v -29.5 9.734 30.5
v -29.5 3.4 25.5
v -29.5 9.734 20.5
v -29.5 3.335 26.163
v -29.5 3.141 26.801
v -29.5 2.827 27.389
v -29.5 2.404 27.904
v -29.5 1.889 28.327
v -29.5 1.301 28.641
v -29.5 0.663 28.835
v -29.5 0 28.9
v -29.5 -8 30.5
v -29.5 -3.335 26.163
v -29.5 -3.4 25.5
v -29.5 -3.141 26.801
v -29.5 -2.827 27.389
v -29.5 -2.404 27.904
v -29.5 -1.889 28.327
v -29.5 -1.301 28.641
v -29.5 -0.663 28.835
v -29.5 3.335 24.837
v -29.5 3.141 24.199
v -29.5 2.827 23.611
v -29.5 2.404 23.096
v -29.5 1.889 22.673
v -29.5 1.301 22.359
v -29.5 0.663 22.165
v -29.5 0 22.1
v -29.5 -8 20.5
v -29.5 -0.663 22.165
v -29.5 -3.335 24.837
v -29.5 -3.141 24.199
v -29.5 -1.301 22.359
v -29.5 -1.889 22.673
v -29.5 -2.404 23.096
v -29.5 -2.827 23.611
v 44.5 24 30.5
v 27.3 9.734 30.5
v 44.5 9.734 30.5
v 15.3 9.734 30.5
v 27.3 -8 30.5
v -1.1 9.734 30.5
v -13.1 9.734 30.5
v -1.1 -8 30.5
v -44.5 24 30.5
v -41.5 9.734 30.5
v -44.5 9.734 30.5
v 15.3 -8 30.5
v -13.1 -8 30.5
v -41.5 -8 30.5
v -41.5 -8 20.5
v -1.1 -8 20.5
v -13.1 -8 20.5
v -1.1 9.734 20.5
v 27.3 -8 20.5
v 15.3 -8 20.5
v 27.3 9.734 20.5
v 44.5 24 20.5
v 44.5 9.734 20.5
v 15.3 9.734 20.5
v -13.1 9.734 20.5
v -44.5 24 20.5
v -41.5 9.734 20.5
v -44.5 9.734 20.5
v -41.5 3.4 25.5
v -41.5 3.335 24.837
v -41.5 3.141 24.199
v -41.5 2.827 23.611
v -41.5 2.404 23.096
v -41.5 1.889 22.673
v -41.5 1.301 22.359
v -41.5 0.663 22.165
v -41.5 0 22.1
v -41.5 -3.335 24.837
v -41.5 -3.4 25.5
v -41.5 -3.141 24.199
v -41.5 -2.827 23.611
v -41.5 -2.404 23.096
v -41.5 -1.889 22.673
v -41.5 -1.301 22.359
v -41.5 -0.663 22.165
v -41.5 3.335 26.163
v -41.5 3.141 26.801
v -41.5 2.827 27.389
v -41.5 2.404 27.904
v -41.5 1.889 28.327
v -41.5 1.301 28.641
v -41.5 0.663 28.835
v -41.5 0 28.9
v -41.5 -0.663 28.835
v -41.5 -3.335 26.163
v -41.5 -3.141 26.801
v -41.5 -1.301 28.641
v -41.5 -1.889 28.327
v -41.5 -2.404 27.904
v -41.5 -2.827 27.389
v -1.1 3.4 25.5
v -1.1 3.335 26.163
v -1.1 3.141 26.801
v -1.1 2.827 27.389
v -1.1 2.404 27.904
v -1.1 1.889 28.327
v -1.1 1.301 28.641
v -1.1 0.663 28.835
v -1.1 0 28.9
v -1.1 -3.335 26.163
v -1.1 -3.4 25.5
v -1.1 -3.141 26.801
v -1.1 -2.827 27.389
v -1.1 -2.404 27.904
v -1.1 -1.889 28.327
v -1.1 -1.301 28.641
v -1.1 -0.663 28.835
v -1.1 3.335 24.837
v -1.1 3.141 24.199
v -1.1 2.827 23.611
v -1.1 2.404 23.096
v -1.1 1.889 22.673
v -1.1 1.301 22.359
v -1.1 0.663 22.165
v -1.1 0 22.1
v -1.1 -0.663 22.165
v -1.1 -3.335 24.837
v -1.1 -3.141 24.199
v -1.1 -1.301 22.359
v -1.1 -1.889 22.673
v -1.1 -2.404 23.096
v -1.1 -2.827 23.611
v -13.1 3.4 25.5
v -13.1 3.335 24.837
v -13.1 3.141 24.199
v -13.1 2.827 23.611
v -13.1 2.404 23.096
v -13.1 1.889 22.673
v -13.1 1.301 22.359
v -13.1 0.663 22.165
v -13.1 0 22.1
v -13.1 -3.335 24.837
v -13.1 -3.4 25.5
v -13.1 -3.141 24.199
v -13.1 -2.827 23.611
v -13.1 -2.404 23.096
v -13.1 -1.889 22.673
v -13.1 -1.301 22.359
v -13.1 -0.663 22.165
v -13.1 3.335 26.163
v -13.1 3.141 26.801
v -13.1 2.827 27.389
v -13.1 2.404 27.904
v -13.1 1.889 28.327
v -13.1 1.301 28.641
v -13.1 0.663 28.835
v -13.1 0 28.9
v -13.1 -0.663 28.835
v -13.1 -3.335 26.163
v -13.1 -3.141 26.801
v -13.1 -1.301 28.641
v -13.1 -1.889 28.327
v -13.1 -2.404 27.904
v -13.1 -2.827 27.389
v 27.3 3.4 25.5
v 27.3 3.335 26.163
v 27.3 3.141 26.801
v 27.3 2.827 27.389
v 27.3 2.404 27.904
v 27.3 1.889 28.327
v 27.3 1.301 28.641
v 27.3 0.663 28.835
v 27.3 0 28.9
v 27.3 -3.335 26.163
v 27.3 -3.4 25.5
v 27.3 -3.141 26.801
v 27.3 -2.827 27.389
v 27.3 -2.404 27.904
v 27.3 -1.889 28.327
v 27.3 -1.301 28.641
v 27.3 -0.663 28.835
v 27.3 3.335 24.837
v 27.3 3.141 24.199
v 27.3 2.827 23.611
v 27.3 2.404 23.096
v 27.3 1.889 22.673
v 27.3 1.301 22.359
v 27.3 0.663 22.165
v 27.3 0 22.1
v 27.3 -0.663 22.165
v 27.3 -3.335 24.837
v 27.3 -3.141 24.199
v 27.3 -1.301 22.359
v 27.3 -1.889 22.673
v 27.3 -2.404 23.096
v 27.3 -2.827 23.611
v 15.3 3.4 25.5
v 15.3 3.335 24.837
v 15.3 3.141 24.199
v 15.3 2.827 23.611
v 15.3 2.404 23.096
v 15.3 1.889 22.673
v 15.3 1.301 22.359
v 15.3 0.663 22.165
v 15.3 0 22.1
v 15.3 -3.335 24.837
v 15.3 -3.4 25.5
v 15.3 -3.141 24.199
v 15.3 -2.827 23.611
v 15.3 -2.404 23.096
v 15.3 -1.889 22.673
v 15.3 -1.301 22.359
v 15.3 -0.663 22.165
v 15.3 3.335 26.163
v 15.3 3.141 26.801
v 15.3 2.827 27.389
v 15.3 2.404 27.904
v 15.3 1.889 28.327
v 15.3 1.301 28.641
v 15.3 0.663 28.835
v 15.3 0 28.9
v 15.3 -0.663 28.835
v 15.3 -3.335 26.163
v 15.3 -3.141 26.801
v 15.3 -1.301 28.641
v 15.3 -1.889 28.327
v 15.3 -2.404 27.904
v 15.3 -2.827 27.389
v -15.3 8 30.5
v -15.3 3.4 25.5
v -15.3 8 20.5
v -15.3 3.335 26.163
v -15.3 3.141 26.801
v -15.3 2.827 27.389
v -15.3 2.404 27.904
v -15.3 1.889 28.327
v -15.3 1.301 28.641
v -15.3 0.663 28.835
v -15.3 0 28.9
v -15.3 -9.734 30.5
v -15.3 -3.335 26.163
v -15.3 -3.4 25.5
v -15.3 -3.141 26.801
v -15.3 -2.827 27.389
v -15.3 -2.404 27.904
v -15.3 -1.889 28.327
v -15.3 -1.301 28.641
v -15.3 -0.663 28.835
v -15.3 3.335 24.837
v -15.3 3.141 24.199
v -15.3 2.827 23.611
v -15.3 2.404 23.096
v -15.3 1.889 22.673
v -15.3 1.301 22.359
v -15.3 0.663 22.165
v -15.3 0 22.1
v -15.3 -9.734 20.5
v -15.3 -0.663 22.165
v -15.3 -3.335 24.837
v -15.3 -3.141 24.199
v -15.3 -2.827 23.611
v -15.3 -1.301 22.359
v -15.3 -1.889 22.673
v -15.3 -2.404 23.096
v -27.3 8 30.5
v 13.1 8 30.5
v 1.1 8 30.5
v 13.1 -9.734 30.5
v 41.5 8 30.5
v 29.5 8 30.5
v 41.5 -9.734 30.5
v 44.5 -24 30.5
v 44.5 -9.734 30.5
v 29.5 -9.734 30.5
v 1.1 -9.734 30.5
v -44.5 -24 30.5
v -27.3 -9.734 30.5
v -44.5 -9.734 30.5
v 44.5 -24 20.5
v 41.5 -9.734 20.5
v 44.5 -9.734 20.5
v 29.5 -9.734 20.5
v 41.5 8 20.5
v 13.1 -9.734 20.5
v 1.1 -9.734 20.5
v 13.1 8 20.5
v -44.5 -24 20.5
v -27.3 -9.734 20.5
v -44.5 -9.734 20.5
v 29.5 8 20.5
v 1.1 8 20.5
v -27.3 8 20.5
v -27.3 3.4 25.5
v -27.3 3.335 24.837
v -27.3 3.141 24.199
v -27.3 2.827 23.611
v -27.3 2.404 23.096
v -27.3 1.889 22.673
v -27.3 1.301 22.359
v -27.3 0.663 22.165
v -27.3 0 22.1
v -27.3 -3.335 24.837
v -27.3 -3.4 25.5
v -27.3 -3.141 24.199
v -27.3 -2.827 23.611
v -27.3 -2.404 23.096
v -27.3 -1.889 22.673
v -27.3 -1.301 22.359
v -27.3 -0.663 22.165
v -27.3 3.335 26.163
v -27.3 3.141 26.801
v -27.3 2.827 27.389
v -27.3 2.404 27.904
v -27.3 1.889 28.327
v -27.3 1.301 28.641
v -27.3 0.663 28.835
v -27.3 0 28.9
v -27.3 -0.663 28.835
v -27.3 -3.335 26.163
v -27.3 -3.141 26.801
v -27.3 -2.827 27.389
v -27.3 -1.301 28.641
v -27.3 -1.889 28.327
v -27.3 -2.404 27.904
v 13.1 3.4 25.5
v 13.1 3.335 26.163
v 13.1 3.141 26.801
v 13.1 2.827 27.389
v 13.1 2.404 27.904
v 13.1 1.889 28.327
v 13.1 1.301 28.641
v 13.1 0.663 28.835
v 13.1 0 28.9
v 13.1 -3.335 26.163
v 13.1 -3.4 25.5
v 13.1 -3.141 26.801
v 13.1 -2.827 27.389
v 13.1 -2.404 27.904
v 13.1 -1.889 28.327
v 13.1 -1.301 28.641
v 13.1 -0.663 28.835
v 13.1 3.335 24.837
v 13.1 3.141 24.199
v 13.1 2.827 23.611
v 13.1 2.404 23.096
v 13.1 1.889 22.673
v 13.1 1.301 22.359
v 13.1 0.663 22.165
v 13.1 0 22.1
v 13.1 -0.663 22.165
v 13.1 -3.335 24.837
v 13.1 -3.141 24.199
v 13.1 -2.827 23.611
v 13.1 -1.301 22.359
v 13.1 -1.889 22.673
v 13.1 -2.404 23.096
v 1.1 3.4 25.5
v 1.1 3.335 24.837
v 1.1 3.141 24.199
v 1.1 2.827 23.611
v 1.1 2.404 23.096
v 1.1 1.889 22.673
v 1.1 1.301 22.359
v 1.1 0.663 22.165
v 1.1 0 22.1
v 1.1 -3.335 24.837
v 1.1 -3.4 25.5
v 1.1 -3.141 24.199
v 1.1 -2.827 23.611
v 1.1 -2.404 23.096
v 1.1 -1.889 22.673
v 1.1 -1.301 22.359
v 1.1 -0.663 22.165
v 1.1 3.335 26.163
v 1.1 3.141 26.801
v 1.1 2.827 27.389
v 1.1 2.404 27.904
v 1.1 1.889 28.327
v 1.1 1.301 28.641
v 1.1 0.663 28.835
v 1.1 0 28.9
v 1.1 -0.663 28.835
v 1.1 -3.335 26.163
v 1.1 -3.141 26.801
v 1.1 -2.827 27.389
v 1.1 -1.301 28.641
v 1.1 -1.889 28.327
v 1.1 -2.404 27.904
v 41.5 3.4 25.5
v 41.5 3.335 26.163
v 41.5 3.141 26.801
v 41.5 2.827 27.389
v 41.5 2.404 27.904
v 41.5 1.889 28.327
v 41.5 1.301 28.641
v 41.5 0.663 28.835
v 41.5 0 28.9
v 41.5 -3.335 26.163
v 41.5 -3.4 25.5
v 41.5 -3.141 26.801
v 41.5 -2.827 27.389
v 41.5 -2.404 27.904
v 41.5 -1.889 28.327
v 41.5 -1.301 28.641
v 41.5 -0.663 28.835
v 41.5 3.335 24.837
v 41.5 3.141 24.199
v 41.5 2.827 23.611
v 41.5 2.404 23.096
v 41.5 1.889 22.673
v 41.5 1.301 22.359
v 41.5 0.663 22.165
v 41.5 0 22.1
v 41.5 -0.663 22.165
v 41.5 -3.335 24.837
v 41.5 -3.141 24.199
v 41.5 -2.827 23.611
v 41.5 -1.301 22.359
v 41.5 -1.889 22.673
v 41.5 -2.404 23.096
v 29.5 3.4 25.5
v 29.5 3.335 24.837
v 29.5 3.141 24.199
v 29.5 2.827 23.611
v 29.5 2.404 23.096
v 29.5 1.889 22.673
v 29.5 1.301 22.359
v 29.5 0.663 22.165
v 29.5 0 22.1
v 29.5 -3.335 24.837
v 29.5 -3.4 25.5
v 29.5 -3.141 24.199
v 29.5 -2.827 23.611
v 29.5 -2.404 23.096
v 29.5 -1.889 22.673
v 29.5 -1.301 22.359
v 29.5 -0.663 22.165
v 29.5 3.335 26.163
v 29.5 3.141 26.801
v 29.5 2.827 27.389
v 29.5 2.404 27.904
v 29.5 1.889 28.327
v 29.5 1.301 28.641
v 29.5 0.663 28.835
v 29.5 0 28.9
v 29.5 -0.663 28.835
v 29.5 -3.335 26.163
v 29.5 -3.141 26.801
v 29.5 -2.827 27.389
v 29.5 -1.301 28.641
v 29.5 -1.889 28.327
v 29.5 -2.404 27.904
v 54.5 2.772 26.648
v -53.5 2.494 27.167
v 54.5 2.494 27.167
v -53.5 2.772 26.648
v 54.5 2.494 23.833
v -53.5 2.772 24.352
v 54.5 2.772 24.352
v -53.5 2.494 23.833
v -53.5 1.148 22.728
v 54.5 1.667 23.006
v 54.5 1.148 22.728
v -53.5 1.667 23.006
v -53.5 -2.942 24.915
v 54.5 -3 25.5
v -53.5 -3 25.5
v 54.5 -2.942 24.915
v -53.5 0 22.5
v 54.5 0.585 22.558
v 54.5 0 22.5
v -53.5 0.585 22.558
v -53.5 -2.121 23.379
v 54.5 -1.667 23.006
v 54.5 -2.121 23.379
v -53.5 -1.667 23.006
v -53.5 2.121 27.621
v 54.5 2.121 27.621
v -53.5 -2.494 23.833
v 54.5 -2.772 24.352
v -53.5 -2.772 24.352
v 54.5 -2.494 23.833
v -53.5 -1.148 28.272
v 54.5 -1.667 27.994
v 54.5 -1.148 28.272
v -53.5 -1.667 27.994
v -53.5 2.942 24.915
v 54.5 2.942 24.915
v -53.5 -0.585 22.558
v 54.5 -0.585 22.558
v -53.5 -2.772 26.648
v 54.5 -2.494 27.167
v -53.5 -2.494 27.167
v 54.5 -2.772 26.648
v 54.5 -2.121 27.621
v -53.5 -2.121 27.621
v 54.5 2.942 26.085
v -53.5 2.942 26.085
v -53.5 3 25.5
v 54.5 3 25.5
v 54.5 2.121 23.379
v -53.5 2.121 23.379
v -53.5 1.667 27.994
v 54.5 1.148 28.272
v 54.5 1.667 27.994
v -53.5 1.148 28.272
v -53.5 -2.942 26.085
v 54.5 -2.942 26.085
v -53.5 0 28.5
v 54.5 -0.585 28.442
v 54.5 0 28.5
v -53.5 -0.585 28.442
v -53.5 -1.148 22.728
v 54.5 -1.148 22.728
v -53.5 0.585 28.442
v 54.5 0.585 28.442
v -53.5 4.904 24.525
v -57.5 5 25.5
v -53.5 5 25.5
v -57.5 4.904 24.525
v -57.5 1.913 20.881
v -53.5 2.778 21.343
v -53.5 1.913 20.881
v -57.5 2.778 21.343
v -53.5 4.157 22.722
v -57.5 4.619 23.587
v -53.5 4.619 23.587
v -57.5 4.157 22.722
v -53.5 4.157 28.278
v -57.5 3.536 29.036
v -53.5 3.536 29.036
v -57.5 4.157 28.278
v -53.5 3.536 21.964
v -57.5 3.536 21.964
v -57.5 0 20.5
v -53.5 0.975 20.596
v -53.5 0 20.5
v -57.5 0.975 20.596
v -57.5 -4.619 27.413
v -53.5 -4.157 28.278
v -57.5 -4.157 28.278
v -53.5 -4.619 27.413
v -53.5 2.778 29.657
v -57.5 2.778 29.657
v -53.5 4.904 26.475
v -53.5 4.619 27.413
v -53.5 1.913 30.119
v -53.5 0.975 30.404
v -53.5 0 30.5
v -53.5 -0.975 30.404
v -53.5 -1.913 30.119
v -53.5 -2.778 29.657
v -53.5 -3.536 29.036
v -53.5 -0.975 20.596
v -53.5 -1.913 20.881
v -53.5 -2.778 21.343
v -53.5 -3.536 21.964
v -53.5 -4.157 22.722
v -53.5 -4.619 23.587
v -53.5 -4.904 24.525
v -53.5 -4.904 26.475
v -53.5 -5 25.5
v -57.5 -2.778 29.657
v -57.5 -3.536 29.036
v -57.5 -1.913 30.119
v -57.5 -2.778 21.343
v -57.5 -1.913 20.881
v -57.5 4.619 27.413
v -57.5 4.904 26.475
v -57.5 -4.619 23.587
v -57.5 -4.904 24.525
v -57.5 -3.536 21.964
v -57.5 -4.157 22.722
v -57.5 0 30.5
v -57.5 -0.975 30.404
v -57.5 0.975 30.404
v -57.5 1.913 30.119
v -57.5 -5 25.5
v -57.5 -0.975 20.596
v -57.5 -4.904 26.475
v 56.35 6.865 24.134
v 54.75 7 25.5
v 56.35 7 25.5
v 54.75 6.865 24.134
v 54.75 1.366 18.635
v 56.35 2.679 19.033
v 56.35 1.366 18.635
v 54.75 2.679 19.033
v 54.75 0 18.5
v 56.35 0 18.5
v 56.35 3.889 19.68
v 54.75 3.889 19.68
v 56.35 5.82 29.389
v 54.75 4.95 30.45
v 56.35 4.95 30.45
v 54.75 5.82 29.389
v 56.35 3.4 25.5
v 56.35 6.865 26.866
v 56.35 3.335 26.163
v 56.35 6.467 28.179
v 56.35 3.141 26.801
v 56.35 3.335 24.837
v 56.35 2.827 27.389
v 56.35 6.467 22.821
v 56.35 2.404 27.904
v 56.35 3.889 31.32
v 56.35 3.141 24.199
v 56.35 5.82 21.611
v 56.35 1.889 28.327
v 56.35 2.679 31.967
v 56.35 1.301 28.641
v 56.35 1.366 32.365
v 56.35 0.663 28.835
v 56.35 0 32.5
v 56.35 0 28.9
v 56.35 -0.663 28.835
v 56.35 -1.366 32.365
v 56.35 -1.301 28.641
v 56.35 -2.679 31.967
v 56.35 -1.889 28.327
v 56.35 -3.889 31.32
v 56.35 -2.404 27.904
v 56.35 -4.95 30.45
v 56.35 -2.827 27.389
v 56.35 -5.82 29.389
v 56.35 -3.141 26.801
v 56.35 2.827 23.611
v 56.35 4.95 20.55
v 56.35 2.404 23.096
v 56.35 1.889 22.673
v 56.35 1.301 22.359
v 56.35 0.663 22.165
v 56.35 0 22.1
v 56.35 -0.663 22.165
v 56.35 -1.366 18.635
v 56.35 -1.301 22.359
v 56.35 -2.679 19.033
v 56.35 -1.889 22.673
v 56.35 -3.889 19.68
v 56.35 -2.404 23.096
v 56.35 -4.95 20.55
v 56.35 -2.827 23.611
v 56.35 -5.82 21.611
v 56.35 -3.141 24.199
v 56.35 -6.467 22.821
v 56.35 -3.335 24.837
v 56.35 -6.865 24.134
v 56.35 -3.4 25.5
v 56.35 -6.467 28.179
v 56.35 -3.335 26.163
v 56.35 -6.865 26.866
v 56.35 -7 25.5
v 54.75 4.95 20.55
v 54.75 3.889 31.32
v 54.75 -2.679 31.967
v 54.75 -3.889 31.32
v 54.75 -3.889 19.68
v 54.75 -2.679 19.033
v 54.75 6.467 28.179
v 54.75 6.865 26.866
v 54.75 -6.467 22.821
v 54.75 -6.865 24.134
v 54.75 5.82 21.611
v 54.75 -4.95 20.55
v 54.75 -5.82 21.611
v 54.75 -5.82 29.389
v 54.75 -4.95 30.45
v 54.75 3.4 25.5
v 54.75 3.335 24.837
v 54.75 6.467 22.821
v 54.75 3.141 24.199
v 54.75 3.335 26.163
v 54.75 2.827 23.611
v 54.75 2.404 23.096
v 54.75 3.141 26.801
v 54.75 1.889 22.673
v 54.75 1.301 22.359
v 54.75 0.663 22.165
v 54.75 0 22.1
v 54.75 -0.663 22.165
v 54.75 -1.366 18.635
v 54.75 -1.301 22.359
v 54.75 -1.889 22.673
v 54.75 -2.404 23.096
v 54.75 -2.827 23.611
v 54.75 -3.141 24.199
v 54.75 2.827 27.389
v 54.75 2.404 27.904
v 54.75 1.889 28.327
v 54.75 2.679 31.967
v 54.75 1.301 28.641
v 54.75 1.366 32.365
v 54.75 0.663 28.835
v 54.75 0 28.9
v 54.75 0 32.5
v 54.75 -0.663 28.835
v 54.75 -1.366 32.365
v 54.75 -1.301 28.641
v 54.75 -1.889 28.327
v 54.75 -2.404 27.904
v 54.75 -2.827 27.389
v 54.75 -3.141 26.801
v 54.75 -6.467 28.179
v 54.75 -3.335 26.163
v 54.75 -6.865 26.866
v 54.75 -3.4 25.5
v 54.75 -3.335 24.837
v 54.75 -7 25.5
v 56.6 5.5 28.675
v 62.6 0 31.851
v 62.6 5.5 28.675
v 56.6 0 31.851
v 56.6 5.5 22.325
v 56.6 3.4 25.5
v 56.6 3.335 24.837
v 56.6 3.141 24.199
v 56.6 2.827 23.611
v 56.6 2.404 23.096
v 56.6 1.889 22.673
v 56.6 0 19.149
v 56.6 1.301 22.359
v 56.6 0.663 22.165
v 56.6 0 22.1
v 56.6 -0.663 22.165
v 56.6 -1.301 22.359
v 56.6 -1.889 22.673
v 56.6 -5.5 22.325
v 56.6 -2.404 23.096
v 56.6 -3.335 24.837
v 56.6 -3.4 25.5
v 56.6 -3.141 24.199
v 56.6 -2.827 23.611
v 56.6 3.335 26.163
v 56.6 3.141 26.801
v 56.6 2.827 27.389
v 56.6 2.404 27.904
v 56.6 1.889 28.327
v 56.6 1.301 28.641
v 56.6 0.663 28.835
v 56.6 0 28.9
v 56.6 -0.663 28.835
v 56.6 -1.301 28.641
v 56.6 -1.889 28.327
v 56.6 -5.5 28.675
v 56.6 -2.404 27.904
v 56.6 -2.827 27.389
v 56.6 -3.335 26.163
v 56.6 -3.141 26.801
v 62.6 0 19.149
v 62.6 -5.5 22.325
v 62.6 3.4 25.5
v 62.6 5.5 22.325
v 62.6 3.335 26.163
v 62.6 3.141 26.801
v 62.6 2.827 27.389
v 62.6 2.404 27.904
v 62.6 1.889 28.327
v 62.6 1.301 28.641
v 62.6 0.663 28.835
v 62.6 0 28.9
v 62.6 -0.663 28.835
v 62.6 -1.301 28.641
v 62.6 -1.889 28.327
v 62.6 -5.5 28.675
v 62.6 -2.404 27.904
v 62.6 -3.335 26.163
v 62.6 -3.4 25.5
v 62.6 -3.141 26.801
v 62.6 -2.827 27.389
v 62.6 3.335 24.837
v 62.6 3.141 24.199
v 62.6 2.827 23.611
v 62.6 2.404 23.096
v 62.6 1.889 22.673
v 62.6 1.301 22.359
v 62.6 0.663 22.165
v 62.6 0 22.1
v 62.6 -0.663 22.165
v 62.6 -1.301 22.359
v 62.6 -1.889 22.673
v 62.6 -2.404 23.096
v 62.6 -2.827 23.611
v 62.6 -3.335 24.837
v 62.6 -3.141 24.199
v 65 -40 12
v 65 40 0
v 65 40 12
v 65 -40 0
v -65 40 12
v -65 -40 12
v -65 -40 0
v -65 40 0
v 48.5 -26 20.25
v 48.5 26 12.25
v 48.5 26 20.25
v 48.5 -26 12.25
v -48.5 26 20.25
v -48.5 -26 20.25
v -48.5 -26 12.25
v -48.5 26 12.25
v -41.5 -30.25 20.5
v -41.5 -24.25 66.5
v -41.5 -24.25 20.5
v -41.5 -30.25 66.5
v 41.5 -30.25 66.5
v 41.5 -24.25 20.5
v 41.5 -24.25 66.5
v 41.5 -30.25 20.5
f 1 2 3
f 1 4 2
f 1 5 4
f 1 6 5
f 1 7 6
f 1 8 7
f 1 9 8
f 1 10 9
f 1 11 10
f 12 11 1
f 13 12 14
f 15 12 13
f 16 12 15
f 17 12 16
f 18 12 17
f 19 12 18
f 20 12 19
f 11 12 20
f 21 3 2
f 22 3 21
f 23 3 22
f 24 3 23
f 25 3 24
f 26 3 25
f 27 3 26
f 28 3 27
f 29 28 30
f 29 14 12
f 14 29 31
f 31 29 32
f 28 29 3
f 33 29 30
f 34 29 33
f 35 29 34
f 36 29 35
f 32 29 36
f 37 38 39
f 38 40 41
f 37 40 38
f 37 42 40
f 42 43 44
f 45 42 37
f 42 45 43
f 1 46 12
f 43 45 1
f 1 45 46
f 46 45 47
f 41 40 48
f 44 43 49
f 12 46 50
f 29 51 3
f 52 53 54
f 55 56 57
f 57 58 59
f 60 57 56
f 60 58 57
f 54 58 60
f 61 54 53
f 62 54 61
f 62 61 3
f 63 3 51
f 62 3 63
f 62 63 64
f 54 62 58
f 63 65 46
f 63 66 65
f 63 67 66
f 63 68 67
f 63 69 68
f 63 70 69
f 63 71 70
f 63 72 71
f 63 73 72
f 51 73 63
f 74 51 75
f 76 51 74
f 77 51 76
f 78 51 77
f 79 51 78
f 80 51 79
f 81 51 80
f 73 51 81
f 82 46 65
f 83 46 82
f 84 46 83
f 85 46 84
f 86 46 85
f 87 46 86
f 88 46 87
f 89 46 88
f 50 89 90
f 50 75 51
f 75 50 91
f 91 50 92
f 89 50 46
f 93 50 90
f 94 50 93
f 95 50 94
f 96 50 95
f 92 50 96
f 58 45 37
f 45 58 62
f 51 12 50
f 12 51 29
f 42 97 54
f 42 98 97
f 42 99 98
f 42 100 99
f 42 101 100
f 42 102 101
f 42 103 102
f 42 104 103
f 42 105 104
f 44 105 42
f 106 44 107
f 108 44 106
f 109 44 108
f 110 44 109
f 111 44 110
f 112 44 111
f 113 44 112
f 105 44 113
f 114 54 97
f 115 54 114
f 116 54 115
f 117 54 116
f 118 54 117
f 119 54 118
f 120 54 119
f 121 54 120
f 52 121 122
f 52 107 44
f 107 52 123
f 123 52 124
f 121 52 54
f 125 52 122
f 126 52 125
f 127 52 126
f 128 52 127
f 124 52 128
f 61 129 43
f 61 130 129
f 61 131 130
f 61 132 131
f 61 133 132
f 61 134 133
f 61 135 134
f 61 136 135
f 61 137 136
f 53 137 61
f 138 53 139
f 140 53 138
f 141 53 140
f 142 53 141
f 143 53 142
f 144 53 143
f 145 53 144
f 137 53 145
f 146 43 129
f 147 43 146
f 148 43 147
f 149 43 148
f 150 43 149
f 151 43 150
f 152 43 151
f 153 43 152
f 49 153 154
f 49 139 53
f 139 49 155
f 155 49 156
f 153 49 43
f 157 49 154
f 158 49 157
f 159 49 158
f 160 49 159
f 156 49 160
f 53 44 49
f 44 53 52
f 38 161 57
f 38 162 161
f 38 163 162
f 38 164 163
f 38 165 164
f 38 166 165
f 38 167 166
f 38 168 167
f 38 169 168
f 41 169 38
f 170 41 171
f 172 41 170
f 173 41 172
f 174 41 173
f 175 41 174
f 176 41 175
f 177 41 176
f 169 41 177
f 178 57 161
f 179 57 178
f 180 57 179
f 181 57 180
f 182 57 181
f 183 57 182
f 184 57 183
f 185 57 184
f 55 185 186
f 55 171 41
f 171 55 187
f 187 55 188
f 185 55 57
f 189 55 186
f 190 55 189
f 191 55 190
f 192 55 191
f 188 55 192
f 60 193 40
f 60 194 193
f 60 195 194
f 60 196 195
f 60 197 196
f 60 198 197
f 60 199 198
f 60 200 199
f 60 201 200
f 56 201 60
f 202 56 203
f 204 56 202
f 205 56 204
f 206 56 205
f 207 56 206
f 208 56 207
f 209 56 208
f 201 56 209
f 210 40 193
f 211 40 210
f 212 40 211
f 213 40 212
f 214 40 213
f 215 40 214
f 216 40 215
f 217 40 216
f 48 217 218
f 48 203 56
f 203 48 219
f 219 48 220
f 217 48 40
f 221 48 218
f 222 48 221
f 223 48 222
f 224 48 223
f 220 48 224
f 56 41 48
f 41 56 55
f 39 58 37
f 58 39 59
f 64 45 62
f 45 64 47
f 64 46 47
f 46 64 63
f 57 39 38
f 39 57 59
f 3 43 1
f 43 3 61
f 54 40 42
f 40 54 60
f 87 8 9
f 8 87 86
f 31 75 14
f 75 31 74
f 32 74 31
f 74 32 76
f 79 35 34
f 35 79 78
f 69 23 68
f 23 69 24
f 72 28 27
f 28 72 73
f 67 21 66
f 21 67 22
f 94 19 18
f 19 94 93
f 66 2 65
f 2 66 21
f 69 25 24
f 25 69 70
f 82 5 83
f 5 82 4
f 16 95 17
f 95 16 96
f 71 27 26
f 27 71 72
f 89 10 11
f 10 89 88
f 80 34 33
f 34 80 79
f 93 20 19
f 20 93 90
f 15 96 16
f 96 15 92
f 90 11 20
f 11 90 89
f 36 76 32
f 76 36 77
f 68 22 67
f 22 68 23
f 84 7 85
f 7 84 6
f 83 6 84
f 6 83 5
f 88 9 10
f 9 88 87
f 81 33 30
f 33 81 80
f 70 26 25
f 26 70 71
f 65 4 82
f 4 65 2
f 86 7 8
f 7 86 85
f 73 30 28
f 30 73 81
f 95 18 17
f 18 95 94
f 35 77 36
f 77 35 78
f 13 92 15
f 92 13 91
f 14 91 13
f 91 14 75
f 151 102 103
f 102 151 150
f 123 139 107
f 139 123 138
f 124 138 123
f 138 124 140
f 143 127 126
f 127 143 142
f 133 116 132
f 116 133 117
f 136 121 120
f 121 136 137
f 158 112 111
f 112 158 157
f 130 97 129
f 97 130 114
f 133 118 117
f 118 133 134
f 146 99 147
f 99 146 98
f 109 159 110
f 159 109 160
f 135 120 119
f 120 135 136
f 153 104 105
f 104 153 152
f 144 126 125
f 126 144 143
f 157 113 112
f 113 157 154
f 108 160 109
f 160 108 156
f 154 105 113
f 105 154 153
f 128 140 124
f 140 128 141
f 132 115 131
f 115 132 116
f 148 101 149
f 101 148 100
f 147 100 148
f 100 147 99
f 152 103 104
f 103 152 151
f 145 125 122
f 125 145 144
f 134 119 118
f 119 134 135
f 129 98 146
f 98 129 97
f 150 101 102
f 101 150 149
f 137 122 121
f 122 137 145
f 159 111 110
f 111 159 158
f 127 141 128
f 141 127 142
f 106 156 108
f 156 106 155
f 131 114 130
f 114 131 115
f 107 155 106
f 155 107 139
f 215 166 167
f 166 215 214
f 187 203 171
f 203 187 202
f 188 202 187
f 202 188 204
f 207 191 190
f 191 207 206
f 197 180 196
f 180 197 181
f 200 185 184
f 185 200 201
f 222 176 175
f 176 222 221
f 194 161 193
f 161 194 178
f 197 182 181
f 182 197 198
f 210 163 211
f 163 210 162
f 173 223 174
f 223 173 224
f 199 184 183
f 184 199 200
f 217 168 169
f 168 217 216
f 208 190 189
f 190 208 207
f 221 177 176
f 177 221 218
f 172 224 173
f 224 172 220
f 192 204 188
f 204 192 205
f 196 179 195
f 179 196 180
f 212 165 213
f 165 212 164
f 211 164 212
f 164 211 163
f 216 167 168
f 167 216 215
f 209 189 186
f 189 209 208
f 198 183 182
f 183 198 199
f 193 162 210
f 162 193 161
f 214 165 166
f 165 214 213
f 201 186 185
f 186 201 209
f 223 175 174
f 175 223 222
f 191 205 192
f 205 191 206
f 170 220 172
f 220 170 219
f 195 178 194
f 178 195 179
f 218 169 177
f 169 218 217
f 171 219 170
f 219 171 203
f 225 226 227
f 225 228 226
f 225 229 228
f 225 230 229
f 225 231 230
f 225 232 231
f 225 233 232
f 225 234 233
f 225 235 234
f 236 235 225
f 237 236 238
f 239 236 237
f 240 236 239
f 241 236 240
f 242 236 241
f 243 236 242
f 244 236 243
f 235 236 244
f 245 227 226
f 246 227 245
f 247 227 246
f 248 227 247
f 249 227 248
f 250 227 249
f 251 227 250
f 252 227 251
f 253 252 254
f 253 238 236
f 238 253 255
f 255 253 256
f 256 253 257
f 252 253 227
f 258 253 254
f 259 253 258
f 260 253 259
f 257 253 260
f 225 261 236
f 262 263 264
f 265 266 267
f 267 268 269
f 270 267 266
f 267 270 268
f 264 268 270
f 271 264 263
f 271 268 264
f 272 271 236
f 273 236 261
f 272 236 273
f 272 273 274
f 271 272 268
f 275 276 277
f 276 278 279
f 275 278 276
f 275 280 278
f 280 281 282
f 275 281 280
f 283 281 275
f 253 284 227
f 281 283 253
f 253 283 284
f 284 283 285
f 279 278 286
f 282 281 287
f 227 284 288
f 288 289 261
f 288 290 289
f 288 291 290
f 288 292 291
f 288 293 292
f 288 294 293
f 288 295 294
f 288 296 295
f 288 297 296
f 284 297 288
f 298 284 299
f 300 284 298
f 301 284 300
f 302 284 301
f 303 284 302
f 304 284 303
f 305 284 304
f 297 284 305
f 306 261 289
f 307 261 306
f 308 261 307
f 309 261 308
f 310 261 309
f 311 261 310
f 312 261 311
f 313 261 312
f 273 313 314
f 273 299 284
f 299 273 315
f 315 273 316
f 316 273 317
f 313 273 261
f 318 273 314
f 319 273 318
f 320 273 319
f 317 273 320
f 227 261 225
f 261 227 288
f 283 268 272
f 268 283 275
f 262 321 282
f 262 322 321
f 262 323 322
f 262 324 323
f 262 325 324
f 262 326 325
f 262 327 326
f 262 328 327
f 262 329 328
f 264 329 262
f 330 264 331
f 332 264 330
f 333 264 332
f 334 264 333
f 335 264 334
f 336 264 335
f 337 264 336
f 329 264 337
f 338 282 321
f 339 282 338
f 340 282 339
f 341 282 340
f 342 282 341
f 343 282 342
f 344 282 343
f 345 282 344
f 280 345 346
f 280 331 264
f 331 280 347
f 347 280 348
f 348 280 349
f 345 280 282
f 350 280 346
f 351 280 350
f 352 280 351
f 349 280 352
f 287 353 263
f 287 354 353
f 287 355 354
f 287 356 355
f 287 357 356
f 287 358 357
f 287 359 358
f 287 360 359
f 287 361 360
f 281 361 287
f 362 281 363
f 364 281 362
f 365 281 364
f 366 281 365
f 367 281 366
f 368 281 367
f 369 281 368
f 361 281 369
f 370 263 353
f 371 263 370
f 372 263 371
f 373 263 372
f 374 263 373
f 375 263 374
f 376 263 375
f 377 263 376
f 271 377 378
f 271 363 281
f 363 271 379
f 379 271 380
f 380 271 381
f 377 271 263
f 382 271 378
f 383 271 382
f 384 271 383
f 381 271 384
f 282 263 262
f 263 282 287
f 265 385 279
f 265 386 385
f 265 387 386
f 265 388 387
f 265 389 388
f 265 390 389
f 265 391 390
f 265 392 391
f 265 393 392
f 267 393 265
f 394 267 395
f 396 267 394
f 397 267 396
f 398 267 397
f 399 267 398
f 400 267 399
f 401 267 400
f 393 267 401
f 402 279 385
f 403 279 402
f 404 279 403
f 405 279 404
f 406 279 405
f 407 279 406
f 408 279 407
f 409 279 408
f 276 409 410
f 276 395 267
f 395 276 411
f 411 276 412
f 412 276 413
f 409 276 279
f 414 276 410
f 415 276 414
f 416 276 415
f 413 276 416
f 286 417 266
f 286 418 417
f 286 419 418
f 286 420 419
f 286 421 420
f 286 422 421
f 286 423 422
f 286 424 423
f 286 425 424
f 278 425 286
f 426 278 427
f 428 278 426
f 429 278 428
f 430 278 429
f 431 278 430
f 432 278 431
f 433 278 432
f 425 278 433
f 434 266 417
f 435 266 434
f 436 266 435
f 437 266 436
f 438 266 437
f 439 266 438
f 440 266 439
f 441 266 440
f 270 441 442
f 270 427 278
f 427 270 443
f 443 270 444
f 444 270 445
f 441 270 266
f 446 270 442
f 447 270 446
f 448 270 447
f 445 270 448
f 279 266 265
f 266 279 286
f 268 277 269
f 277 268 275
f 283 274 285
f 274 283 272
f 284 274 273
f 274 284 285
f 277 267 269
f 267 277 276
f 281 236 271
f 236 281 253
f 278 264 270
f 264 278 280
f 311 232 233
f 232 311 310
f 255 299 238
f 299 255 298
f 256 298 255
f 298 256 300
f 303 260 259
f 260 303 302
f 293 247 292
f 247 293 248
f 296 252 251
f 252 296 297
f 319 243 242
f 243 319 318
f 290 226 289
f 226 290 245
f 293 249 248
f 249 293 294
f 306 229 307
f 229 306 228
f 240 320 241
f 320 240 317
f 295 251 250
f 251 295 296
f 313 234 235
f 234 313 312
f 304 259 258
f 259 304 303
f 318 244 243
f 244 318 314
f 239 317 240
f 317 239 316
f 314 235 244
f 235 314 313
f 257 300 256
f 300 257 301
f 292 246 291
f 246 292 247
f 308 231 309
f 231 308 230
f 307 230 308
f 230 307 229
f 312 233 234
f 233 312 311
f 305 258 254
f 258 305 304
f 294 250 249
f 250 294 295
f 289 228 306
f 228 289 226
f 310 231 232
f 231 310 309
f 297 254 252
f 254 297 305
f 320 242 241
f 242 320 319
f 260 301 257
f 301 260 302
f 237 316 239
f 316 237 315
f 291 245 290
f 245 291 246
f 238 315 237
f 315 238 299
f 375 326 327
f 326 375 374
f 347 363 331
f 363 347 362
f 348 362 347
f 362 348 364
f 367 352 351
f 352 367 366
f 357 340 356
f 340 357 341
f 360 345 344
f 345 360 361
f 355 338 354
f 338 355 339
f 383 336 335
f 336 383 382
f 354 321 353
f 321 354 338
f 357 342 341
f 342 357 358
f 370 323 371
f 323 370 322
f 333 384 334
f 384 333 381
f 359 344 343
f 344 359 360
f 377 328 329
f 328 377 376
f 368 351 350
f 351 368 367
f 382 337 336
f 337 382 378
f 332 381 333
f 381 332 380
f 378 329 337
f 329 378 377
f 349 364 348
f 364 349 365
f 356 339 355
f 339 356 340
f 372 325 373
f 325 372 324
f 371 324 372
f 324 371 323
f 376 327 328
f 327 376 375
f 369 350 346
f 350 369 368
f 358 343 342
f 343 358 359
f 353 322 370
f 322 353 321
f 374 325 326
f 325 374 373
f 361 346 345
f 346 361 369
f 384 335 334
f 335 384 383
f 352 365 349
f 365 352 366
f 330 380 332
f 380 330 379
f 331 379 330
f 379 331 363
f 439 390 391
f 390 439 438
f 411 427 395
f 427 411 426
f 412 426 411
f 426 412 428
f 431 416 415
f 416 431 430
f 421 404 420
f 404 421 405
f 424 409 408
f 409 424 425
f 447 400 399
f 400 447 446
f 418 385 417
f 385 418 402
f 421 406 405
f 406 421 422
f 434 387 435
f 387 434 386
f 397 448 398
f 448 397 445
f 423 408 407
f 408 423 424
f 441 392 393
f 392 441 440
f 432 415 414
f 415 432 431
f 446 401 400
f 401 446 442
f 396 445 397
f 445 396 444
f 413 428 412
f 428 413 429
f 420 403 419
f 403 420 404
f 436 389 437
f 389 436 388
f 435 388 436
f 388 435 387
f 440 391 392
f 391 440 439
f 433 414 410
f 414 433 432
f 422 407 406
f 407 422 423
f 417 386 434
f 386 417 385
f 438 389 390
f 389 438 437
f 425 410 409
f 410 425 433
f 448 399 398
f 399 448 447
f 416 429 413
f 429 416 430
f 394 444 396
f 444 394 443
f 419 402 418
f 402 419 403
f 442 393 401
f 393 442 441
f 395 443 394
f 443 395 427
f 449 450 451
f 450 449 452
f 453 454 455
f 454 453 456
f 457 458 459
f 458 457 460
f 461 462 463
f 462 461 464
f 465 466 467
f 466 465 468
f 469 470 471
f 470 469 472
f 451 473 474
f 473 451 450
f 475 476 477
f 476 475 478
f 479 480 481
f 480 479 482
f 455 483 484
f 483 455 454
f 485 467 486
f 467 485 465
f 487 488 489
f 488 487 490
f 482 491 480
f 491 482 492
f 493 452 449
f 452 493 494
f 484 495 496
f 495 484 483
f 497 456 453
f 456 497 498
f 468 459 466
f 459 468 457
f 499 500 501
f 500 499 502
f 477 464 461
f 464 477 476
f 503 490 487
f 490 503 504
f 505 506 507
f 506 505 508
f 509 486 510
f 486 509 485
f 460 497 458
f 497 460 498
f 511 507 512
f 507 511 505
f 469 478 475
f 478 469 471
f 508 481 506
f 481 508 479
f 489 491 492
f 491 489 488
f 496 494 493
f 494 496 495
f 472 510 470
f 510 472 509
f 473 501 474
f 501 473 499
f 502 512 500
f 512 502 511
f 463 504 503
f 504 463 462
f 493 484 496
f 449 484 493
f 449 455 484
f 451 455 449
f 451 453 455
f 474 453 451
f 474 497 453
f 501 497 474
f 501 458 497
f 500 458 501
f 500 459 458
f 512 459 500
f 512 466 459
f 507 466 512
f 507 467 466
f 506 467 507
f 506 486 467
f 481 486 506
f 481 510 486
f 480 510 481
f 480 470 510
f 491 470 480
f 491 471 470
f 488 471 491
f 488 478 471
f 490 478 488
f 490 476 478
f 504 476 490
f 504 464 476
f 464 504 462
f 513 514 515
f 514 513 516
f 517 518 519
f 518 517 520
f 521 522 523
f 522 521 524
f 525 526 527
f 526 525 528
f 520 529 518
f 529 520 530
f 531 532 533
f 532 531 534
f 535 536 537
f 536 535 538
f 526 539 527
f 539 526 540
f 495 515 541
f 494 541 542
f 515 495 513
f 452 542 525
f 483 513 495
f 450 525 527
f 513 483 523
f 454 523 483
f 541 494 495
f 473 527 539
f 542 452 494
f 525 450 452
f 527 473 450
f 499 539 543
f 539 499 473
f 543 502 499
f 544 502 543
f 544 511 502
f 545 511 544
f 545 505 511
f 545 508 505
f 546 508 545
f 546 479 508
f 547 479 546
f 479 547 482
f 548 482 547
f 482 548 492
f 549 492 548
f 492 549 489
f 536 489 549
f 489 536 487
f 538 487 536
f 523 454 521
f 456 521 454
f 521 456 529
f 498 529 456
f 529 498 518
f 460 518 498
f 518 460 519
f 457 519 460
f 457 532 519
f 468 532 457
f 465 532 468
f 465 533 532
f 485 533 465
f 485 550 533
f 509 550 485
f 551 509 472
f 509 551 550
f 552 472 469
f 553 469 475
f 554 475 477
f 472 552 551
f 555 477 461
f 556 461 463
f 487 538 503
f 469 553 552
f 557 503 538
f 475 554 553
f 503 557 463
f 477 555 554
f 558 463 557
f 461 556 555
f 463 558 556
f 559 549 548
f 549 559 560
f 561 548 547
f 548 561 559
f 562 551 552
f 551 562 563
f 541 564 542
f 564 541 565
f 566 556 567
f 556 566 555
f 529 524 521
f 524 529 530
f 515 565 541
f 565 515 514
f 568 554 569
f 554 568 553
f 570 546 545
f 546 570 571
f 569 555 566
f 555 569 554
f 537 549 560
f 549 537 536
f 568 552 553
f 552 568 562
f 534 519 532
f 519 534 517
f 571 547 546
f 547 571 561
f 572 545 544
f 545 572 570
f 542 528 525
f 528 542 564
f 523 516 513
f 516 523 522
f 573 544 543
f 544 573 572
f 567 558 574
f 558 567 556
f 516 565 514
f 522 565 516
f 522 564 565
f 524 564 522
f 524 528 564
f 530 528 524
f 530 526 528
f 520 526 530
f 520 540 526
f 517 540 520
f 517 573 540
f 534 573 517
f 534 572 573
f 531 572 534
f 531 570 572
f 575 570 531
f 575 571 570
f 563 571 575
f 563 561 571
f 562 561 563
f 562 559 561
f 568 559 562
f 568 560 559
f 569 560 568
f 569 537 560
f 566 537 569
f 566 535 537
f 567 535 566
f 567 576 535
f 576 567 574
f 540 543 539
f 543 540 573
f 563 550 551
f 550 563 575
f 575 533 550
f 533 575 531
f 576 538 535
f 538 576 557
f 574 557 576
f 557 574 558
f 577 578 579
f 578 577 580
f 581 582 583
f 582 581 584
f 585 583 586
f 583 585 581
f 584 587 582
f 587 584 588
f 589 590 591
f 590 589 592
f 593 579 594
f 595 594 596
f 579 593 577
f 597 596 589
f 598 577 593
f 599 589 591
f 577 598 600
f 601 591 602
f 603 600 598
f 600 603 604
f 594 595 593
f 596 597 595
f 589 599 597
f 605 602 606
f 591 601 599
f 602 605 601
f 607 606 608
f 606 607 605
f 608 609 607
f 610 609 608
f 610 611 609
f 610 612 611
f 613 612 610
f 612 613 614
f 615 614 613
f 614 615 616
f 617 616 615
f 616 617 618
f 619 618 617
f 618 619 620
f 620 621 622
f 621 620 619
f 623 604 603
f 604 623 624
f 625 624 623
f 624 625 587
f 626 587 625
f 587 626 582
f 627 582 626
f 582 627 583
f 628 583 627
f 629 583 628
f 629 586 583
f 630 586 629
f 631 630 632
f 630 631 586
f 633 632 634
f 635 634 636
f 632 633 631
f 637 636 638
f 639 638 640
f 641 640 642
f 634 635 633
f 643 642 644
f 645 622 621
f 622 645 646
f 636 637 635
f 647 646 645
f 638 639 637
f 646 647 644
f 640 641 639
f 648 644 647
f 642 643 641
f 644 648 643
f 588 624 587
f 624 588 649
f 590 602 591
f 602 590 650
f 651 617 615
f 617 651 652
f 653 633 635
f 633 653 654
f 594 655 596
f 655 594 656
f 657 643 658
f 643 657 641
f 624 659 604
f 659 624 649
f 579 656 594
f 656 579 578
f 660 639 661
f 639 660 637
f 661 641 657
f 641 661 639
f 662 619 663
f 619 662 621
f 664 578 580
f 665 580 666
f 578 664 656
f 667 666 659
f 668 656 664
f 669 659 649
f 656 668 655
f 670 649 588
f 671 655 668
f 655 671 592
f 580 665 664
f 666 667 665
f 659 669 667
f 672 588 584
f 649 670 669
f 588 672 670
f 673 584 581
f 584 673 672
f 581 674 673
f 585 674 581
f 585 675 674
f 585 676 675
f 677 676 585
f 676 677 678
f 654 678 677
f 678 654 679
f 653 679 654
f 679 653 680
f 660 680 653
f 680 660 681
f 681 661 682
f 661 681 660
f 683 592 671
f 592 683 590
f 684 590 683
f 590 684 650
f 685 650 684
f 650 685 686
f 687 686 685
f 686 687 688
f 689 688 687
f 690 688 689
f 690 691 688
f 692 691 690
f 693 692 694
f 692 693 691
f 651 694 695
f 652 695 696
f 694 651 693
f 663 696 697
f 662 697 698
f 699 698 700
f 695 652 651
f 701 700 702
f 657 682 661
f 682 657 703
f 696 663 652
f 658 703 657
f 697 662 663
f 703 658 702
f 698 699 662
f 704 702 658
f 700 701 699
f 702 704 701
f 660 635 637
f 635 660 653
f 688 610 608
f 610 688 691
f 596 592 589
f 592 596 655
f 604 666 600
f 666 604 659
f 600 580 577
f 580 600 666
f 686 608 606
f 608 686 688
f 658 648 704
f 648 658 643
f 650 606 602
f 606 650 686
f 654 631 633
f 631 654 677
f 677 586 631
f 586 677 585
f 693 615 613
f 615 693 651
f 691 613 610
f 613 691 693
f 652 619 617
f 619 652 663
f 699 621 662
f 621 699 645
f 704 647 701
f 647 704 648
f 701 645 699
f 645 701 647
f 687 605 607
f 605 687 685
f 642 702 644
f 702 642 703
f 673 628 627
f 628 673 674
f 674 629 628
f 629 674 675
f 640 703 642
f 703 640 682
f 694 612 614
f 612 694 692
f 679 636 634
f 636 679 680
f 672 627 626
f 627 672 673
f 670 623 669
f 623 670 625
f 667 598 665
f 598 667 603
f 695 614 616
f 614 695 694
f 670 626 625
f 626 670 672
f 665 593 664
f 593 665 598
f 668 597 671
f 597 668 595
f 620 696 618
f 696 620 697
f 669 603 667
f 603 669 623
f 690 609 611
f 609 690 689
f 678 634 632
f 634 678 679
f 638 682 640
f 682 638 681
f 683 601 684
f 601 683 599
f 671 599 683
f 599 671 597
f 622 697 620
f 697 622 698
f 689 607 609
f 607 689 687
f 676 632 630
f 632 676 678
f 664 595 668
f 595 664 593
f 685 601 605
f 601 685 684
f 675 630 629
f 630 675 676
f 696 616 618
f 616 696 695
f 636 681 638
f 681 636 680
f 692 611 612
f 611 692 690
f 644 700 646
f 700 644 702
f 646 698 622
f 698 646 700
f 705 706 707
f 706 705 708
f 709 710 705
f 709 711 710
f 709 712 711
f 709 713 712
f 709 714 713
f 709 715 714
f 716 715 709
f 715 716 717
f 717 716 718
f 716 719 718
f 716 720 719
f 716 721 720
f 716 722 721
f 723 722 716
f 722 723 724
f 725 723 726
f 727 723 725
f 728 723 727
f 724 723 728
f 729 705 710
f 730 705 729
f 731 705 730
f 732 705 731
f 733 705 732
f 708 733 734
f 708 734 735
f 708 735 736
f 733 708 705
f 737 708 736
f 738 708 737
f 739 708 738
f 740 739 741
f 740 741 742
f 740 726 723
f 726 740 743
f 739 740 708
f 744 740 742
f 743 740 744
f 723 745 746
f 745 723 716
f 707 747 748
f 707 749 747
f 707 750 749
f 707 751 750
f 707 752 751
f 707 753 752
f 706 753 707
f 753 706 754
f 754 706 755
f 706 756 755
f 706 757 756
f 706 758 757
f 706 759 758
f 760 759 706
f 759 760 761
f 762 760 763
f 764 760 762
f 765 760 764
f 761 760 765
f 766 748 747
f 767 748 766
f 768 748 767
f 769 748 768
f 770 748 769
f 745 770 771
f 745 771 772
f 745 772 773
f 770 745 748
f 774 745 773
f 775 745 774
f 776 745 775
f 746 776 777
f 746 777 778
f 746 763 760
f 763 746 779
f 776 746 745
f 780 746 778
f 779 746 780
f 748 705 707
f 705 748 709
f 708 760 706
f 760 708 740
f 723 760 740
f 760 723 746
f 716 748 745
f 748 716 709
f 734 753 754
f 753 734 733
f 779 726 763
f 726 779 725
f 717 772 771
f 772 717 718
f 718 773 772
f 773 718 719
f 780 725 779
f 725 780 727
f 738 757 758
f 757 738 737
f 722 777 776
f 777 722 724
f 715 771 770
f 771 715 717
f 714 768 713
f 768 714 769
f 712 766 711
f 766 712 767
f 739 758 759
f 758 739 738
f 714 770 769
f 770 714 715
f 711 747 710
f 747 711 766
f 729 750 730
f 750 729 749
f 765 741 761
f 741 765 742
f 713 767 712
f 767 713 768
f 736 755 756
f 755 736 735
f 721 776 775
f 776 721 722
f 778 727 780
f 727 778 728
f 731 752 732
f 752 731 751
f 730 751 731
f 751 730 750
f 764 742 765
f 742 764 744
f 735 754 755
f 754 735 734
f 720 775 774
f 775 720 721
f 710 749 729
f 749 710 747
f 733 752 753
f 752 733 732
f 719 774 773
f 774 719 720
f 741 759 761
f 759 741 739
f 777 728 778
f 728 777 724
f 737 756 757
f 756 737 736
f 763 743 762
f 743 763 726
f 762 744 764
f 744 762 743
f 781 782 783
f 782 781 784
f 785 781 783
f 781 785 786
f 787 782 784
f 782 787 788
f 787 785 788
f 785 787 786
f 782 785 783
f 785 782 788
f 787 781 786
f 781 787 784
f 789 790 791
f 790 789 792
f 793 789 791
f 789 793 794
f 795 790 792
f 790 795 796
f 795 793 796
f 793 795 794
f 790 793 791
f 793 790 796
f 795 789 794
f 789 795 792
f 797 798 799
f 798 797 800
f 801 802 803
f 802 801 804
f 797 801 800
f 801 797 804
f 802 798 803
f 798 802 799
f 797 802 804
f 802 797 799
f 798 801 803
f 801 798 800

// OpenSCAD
$fn = 32;

// ------------------------------------------------------------------------
// Comb hinge with flap: leaf 89 x 24 mm, pin d6, flap 46 mm
// Every part is its own module, assembly() places every instance.
// ------------------------------------------------------------------------

// --- part 1 ---
module hinge_bed() {
  difference() {
    translate([-65, -40, 0]) cube([130, 80, 12]);
  }
}

// --- part 2 ---
module hinge_riser() {
  difference() {
    translate([-48.5, -26, 0]) cube([97, 52, 8]);
  }
}

// --- part 3 ---
module hinge_leaf_a() {
  difference() {
    union() {
      translate([-41.5, -8, -5]) cube([12, 32, 10]);
      translate([-13.1, -8, -5]) cube([12, 32, 10]);
      translate([15.3, -8, -5]) cube([12, 32, 10]);
      translate([-44.5, 9.734, -5]) cube([89, 14.266, 10]);
    }
    translate([-35.5, 0, 0]) rotate([0, 90, 0]) cylinder(h = 14, d = 6.8, center = true);
    translate([-7.1, 0, 0]) rotate([0, 90, 0]) cylinder(h = 14, d = 6.8, center = true);
    translate([21.3, 0, 0]) rotate([0, 90, 0]) cylinder(h = 14, d = 6.8, center = true);
  }
}

// --- part 4 ---
module hinge_leaf_b() {
  difference() {
    union() {
      translate([-27.3, -24, -5]) cube([12, 32, 10]);
      translate([1.1, -24, -5]) cube([12, 32, 10]);
      translate([29.5, -24, -5]) cube([12, 32, 10]);
      translate([-44.5, -24, -5]) cube([89, 14.266, 10]);
    }
    translate([-21.3, 0, 0]) rotate([0, 90, 0]) cylinder(h = 14, d = 6.8, center = true);
    translate([7.1, 0, 0]) rotate([0, 90, 0]) cylinder(h = 14, d = 6.8, center = true);
    translate([35.5, 0, 0]) rotate([0, 90, 0]) cylinder(h = 14, d = 6.8, center = true);
  }
}

// --- part 5 ---
module hinge_flap() {
  difference() {
    translate([-41.5, -23, 0]) cube([83, 46, 6]);
  }
}

// --- part 6 ---
module hinge_pin() {
  rotate([0, 90, 0]) cylinder(h = 109, d = 6, center = true);
  translate([-57.5, 0, 0]) rotate([0, 90, 0]) cylinder(h = 4, d = 10);
}

// --- part 7 ---
module pin_washer() {
  difference() {
      translate([0, 0, 0]) cylinder(h = 1.6, d = 14);
      translate([0, 0, -1]) cylinder(h = 3.6, d = 6.8);
    }
}

// --- part 8 ---
module pin_nut() {
  difference() {
    linear_extrude(height = 6) polygon(points = [[6.351, 0], [3.175, 5.5], [-3.175, 5.5], [-6.351, 0], [-3.175, -5.5], [3.175, -5.5]]);
    translate([0, 0, -1]) cylinder(h = 8, d = 6.8);
  }
}

// --- assembly ---
module assembly() {
  color([0.80, 0.24, 0.20]) translate([0, 0, 0]) rotate([0, 0, 0]) hinge_bed();
  color([0.20, 0.45, 0.75]) translate([0, 0, 12.25]) rotate([0, 0, 0]) hinge_riser();
  color([0.25, 0.62, 0.32]) translate([0, 0, 25.5]) rotate([0, 0, 0]) hinge_leaf_a();
  color([0.92, 0.70, 0.18]) translate([0, 0, 25.5]) rotate([0, 0, 0]) hinge_leaf_b();
  color([0.58, 0.35, 0.70]) translate([0, -24.25, 43.5]) rotate([90, 0, 0]) hinge_flap();
  color([0.16, 0.66, 0.66]) translate([0, 0, 25.5]) rotate([0, 0, 0]) hinge_pin();
  color([0.85, 0.48, 0.18]) translate([54.75, 0, 25.5]) rotate([0, 90, 0]) pin_washer();
  color([0.55, 0.60, 0.65]) translate([56.6, 0, 25.5]) rotate([0, 90, 0]) pin_nut();
}

assembly();
